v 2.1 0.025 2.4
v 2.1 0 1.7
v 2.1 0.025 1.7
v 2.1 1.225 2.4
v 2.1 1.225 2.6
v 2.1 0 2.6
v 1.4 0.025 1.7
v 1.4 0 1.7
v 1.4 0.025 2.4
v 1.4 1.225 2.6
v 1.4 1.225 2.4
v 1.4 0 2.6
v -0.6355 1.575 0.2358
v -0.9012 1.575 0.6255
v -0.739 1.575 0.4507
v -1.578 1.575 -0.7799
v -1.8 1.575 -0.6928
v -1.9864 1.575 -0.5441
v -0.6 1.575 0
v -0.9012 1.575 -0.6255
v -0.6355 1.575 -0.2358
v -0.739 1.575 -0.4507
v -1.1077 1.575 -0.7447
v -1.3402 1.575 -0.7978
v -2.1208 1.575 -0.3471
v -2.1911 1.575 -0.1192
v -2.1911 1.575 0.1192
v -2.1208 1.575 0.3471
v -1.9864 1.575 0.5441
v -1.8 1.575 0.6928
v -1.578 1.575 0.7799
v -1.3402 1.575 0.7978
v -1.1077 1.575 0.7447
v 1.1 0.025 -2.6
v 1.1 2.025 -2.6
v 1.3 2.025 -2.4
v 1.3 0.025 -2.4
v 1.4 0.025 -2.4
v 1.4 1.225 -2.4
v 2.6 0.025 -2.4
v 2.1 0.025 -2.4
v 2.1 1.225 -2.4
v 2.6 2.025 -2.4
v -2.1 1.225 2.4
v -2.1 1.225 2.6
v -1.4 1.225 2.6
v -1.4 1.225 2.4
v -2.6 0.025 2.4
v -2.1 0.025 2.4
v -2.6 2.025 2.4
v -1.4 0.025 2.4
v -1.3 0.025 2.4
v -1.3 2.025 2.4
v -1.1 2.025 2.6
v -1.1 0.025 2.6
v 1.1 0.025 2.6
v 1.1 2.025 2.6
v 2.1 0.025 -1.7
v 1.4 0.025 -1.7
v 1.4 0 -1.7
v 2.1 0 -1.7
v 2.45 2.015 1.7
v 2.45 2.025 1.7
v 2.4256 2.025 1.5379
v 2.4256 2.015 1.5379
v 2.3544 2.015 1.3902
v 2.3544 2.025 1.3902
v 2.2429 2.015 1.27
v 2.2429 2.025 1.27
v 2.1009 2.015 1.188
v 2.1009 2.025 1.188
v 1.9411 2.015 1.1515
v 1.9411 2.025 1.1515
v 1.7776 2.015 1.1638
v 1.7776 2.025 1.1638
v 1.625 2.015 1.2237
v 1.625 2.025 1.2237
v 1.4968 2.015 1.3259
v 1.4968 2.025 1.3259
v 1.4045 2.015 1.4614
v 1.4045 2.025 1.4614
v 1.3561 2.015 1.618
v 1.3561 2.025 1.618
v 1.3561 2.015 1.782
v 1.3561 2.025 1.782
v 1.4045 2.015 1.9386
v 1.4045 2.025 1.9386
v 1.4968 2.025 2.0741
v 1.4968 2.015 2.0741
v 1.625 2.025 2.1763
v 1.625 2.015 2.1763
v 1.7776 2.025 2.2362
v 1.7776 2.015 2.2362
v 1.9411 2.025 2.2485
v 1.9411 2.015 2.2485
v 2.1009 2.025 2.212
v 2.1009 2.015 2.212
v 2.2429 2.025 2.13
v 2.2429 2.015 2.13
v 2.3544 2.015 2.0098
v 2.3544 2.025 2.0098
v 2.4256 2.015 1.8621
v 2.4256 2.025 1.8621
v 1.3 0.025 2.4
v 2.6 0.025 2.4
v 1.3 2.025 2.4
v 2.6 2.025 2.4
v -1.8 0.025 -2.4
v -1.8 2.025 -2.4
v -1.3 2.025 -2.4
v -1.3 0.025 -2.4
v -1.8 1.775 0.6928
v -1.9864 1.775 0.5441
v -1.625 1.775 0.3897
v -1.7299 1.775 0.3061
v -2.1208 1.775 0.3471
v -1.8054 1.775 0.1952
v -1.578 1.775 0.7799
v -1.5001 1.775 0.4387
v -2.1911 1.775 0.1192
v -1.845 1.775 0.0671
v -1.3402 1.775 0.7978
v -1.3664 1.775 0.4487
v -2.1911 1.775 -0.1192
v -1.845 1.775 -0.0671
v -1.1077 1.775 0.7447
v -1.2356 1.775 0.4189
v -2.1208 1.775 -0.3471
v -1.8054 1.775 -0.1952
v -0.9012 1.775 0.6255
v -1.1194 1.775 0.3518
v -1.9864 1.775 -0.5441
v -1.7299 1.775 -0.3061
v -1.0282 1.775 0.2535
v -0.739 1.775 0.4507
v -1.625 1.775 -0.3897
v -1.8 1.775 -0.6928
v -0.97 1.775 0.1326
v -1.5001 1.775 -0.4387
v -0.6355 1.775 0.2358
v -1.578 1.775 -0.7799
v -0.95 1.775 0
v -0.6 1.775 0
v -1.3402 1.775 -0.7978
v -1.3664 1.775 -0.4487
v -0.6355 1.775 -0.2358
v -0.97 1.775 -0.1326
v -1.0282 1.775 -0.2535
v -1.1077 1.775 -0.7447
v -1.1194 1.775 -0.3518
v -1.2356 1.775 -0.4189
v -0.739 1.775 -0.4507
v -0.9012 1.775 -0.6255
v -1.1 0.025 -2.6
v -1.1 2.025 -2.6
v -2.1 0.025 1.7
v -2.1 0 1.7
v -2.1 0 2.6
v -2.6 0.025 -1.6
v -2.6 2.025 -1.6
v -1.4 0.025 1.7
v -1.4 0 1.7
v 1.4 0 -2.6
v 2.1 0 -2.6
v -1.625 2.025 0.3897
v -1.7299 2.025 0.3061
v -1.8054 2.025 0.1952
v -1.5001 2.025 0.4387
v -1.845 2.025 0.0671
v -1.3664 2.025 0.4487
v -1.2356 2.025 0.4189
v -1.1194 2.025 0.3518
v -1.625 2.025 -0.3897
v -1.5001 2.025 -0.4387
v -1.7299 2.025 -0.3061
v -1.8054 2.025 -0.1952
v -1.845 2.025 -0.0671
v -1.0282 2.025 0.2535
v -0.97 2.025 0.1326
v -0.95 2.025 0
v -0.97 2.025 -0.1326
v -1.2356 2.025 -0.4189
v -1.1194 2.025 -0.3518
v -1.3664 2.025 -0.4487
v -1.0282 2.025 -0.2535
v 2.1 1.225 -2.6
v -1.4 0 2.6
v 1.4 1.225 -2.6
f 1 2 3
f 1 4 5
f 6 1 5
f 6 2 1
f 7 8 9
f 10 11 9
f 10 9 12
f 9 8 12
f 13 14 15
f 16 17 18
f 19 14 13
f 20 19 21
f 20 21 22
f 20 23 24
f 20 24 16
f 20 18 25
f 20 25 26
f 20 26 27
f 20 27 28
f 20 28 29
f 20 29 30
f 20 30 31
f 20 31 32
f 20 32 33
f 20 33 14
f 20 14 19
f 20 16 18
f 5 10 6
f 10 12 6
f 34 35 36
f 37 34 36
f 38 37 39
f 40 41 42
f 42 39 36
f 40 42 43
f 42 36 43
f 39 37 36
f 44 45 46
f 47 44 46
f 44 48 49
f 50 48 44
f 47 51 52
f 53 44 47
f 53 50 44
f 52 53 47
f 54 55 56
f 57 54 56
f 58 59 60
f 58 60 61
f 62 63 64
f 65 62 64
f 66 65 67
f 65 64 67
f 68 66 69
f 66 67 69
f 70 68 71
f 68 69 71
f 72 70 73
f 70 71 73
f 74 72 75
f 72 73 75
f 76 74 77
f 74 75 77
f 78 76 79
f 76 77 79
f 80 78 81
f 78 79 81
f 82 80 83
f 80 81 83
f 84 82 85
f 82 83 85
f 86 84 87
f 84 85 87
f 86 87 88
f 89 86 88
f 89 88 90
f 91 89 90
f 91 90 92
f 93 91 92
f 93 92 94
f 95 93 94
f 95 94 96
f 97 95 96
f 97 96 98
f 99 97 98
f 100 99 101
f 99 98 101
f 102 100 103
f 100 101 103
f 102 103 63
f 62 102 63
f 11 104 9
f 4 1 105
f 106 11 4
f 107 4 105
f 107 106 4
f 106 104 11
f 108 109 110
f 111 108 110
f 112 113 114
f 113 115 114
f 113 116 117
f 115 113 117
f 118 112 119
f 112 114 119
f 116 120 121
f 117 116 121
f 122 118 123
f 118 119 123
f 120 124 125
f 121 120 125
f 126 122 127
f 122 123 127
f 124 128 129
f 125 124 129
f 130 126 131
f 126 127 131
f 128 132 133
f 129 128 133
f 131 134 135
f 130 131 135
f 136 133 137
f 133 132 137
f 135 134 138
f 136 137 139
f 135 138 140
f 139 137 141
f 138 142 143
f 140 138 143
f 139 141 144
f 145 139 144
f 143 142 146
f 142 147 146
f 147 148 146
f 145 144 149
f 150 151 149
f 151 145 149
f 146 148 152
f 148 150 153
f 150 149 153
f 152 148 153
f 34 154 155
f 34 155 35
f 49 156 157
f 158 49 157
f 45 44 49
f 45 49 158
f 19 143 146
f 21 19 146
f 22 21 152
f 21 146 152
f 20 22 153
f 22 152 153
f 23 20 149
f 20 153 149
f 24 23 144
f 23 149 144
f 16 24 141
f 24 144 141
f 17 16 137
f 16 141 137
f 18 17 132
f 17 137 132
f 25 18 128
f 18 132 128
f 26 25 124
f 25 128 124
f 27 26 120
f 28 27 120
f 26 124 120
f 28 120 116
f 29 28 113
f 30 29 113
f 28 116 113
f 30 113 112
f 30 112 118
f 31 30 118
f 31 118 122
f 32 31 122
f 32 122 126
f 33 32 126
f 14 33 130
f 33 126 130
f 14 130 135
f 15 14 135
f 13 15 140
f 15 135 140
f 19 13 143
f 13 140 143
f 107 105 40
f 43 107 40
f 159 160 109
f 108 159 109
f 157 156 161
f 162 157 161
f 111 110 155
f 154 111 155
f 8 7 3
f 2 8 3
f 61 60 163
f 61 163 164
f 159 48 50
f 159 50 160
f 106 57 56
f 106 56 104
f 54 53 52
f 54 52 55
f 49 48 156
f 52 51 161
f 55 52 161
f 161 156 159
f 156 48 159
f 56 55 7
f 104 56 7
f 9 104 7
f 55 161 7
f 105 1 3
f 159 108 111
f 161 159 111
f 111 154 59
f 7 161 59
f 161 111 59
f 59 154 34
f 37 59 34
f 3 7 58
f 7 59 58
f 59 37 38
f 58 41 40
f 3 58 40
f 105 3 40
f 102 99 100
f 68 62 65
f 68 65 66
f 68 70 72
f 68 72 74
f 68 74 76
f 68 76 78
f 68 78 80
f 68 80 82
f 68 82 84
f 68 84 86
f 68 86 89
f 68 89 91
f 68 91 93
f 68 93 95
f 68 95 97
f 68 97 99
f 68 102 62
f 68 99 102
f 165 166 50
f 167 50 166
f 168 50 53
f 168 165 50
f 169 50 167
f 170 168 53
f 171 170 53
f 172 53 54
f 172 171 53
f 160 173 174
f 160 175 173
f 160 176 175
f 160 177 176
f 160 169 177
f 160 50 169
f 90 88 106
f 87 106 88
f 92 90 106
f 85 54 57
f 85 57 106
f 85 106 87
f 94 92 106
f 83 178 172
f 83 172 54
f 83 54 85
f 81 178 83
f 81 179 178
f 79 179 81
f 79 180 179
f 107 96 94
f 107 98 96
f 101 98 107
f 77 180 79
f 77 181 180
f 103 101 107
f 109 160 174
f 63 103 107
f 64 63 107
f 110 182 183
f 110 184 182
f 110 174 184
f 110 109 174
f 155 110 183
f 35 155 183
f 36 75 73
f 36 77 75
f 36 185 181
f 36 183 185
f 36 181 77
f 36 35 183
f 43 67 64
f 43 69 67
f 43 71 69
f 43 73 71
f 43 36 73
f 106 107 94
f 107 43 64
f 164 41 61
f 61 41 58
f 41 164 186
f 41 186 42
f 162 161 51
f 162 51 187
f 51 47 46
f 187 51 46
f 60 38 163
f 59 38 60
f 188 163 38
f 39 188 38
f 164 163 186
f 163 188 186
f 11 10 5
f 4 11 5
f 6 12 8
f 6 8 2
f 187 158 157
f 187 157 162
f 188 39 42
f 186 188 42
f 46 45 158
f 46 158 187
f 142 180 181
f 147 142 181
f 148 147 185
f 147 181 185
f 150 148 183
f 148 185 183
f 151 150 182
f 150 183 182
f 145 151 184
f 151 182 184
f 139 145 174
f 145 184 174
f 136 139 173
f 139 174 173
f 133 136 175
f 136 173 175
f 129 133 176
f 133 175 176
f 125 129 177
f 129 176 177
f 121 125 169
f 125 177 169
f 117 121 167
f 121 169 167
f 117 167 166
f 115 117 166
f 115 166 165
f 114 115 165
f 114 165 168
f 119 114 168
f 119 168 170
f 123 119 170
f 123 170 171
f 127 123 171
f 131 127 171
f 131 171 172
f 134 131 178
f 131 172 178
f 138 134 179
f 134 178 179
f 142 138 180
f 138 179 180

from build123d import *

# Parameters (mm, degrees)
SKETCH_1_W           = 5.2
SKETCH_1_H           = 5.2
EXTRUDE_1_DEPTH      = 2
CUT_EXTRUDE_1_DEPTH  = 2
SKETCH_4_R           = 0.45
CUT_EXTRUDE_2_DEPTH  = 0.25
SKETCH_7_R           = 0.8
CUT_EXTRUDE_4_DEPTH  = 0.2
CUT_EXTRUDE_5_DEPTH  = 3
SKETCH_8_W           = 0.7
SKETCH_8_H           = 0.9
EXTRUDE_2_DEPTH      = 0.025
EXTRUDE_2_DEPTH_BACK = 1.2
SKETCH_5_R           = 0.55
CUT_EXTRUDE_3_DEPTH  = 0.01


with BuildPart() as part:
    # 草图1 → 凸台-拉伸1 (new body)
    with BuildSketch(Plane(origin=(0, 0.025, 0), x_dir=(1, 0, 0), z_dir=(0, 1, 0))):
        Rectangle(SKETCH_1_W, SKETCH_1_H)
    extrude(amount=EXTRUDE_1_DEPTH)

    # 草图3 → 切除-拉伸1 (cut)
    with BuildSketch(Plane(origin=(0, 2.025, 0), x_dir=(1, 0, 0), z_dir=(0, 1, 0))):
        Polygon((-2.6, 1.6), (-1.6, 2.6), (-2.6, 2.6), align=None)
    extrude(amount=-CUT_EXTRUDE_1_DEPTH, mode=Mode.SUBTRACT)

    # 草图4 → 切除-拉伸2 (cut)
    with BuildSketch(Plane(origin=(0, 2.025, 0), x_dir=(1, 0, 0), z_dir=(0, 1, 0))):
        with Locations((-1.4, 0)):
            Circle(SKETCH_4_R)
    extrude(amount=-CUT_EXTRUDE_2_DEPTH, mode=Mode.SUBTRACT)

    # 草图7 → 切除-拉伸4 (cut)
    with BuildSketch(Plane(origin=(0, 1.775, 0), x_dir=(1, 0, 0), z_dir=(0, 1, 0))):
        with Locations((-1.4, 0)):
            Circle(SKETCH_7_R)
    extrude(amount=-CUT_EXTRUDE_4_DEPTH, mode=Mode.SUBTRACT)

    # 草图9 → 切除-拉伸5 (cut, through all)
    with BuildSketch(Plane(origin=(0, 2.025, 0), x_dir=(1, 0, 0), z_dir=(0, 1, 0))):
        Polygon((-2.6, -2.4), (-1.3, -2.4), (-1.1, -2.6), (1.1, -2.6), (1.3, -2.4), (2.6, -2.4), (2.6, -3.137806102), (-2.6, -3.137806102), align=None)
        Polygon((2.6, 3.137806102), (-2.6, 3.137806102), (-2.6, 2.4), (-1.3, 2.4), (-1.1, 2.6), (1.1, 2.6), (1.3, 2.4), (2.6, 2.4), align=None)
    extrude(amount=-CUT_EXTRUDE_5_DEPTH, mode=Mode.SUBTRACT)

    # 草图8 → 凸台-拉伸2 (add, two sides)
    with BuildSketch(Plane.XZ.offset(-0.025)) as extrude_2_sk:
        with Locations((1.75, 2.15)):
            Rectangle(SKETCH_8_W, SKETCH_8_H)
        with Locations((-1.75, 2.15)):
            Rectangle(SKETCH_8_W, SKETCH_8_H)
        with Locations((1.75, -2.15)):
            Rectangle(SKETCH_8_W, SKETCH_8_H)
    extrude(amount=EXTRUDE_2_DEPTH)
    extrude(extrude_2_sk.sketch, amount=-EXTRUDE_2_DEPTH_BACK)

    # 草图5 → 切除-拉伸3 (cut)
    with BuildSketch(Plane(origin=(0, 2.025, 0), x_dir=(1, 0, 0), z_dir=(0, 1, 0))):
        with Locations((1.9, -1.7)):
            Circle(SKETCH_5_R)
    extrude(amount=-CUT_EXTRUDE_3_DEPTH, mode=Mode.SUBTRACT)


solid = part.part
